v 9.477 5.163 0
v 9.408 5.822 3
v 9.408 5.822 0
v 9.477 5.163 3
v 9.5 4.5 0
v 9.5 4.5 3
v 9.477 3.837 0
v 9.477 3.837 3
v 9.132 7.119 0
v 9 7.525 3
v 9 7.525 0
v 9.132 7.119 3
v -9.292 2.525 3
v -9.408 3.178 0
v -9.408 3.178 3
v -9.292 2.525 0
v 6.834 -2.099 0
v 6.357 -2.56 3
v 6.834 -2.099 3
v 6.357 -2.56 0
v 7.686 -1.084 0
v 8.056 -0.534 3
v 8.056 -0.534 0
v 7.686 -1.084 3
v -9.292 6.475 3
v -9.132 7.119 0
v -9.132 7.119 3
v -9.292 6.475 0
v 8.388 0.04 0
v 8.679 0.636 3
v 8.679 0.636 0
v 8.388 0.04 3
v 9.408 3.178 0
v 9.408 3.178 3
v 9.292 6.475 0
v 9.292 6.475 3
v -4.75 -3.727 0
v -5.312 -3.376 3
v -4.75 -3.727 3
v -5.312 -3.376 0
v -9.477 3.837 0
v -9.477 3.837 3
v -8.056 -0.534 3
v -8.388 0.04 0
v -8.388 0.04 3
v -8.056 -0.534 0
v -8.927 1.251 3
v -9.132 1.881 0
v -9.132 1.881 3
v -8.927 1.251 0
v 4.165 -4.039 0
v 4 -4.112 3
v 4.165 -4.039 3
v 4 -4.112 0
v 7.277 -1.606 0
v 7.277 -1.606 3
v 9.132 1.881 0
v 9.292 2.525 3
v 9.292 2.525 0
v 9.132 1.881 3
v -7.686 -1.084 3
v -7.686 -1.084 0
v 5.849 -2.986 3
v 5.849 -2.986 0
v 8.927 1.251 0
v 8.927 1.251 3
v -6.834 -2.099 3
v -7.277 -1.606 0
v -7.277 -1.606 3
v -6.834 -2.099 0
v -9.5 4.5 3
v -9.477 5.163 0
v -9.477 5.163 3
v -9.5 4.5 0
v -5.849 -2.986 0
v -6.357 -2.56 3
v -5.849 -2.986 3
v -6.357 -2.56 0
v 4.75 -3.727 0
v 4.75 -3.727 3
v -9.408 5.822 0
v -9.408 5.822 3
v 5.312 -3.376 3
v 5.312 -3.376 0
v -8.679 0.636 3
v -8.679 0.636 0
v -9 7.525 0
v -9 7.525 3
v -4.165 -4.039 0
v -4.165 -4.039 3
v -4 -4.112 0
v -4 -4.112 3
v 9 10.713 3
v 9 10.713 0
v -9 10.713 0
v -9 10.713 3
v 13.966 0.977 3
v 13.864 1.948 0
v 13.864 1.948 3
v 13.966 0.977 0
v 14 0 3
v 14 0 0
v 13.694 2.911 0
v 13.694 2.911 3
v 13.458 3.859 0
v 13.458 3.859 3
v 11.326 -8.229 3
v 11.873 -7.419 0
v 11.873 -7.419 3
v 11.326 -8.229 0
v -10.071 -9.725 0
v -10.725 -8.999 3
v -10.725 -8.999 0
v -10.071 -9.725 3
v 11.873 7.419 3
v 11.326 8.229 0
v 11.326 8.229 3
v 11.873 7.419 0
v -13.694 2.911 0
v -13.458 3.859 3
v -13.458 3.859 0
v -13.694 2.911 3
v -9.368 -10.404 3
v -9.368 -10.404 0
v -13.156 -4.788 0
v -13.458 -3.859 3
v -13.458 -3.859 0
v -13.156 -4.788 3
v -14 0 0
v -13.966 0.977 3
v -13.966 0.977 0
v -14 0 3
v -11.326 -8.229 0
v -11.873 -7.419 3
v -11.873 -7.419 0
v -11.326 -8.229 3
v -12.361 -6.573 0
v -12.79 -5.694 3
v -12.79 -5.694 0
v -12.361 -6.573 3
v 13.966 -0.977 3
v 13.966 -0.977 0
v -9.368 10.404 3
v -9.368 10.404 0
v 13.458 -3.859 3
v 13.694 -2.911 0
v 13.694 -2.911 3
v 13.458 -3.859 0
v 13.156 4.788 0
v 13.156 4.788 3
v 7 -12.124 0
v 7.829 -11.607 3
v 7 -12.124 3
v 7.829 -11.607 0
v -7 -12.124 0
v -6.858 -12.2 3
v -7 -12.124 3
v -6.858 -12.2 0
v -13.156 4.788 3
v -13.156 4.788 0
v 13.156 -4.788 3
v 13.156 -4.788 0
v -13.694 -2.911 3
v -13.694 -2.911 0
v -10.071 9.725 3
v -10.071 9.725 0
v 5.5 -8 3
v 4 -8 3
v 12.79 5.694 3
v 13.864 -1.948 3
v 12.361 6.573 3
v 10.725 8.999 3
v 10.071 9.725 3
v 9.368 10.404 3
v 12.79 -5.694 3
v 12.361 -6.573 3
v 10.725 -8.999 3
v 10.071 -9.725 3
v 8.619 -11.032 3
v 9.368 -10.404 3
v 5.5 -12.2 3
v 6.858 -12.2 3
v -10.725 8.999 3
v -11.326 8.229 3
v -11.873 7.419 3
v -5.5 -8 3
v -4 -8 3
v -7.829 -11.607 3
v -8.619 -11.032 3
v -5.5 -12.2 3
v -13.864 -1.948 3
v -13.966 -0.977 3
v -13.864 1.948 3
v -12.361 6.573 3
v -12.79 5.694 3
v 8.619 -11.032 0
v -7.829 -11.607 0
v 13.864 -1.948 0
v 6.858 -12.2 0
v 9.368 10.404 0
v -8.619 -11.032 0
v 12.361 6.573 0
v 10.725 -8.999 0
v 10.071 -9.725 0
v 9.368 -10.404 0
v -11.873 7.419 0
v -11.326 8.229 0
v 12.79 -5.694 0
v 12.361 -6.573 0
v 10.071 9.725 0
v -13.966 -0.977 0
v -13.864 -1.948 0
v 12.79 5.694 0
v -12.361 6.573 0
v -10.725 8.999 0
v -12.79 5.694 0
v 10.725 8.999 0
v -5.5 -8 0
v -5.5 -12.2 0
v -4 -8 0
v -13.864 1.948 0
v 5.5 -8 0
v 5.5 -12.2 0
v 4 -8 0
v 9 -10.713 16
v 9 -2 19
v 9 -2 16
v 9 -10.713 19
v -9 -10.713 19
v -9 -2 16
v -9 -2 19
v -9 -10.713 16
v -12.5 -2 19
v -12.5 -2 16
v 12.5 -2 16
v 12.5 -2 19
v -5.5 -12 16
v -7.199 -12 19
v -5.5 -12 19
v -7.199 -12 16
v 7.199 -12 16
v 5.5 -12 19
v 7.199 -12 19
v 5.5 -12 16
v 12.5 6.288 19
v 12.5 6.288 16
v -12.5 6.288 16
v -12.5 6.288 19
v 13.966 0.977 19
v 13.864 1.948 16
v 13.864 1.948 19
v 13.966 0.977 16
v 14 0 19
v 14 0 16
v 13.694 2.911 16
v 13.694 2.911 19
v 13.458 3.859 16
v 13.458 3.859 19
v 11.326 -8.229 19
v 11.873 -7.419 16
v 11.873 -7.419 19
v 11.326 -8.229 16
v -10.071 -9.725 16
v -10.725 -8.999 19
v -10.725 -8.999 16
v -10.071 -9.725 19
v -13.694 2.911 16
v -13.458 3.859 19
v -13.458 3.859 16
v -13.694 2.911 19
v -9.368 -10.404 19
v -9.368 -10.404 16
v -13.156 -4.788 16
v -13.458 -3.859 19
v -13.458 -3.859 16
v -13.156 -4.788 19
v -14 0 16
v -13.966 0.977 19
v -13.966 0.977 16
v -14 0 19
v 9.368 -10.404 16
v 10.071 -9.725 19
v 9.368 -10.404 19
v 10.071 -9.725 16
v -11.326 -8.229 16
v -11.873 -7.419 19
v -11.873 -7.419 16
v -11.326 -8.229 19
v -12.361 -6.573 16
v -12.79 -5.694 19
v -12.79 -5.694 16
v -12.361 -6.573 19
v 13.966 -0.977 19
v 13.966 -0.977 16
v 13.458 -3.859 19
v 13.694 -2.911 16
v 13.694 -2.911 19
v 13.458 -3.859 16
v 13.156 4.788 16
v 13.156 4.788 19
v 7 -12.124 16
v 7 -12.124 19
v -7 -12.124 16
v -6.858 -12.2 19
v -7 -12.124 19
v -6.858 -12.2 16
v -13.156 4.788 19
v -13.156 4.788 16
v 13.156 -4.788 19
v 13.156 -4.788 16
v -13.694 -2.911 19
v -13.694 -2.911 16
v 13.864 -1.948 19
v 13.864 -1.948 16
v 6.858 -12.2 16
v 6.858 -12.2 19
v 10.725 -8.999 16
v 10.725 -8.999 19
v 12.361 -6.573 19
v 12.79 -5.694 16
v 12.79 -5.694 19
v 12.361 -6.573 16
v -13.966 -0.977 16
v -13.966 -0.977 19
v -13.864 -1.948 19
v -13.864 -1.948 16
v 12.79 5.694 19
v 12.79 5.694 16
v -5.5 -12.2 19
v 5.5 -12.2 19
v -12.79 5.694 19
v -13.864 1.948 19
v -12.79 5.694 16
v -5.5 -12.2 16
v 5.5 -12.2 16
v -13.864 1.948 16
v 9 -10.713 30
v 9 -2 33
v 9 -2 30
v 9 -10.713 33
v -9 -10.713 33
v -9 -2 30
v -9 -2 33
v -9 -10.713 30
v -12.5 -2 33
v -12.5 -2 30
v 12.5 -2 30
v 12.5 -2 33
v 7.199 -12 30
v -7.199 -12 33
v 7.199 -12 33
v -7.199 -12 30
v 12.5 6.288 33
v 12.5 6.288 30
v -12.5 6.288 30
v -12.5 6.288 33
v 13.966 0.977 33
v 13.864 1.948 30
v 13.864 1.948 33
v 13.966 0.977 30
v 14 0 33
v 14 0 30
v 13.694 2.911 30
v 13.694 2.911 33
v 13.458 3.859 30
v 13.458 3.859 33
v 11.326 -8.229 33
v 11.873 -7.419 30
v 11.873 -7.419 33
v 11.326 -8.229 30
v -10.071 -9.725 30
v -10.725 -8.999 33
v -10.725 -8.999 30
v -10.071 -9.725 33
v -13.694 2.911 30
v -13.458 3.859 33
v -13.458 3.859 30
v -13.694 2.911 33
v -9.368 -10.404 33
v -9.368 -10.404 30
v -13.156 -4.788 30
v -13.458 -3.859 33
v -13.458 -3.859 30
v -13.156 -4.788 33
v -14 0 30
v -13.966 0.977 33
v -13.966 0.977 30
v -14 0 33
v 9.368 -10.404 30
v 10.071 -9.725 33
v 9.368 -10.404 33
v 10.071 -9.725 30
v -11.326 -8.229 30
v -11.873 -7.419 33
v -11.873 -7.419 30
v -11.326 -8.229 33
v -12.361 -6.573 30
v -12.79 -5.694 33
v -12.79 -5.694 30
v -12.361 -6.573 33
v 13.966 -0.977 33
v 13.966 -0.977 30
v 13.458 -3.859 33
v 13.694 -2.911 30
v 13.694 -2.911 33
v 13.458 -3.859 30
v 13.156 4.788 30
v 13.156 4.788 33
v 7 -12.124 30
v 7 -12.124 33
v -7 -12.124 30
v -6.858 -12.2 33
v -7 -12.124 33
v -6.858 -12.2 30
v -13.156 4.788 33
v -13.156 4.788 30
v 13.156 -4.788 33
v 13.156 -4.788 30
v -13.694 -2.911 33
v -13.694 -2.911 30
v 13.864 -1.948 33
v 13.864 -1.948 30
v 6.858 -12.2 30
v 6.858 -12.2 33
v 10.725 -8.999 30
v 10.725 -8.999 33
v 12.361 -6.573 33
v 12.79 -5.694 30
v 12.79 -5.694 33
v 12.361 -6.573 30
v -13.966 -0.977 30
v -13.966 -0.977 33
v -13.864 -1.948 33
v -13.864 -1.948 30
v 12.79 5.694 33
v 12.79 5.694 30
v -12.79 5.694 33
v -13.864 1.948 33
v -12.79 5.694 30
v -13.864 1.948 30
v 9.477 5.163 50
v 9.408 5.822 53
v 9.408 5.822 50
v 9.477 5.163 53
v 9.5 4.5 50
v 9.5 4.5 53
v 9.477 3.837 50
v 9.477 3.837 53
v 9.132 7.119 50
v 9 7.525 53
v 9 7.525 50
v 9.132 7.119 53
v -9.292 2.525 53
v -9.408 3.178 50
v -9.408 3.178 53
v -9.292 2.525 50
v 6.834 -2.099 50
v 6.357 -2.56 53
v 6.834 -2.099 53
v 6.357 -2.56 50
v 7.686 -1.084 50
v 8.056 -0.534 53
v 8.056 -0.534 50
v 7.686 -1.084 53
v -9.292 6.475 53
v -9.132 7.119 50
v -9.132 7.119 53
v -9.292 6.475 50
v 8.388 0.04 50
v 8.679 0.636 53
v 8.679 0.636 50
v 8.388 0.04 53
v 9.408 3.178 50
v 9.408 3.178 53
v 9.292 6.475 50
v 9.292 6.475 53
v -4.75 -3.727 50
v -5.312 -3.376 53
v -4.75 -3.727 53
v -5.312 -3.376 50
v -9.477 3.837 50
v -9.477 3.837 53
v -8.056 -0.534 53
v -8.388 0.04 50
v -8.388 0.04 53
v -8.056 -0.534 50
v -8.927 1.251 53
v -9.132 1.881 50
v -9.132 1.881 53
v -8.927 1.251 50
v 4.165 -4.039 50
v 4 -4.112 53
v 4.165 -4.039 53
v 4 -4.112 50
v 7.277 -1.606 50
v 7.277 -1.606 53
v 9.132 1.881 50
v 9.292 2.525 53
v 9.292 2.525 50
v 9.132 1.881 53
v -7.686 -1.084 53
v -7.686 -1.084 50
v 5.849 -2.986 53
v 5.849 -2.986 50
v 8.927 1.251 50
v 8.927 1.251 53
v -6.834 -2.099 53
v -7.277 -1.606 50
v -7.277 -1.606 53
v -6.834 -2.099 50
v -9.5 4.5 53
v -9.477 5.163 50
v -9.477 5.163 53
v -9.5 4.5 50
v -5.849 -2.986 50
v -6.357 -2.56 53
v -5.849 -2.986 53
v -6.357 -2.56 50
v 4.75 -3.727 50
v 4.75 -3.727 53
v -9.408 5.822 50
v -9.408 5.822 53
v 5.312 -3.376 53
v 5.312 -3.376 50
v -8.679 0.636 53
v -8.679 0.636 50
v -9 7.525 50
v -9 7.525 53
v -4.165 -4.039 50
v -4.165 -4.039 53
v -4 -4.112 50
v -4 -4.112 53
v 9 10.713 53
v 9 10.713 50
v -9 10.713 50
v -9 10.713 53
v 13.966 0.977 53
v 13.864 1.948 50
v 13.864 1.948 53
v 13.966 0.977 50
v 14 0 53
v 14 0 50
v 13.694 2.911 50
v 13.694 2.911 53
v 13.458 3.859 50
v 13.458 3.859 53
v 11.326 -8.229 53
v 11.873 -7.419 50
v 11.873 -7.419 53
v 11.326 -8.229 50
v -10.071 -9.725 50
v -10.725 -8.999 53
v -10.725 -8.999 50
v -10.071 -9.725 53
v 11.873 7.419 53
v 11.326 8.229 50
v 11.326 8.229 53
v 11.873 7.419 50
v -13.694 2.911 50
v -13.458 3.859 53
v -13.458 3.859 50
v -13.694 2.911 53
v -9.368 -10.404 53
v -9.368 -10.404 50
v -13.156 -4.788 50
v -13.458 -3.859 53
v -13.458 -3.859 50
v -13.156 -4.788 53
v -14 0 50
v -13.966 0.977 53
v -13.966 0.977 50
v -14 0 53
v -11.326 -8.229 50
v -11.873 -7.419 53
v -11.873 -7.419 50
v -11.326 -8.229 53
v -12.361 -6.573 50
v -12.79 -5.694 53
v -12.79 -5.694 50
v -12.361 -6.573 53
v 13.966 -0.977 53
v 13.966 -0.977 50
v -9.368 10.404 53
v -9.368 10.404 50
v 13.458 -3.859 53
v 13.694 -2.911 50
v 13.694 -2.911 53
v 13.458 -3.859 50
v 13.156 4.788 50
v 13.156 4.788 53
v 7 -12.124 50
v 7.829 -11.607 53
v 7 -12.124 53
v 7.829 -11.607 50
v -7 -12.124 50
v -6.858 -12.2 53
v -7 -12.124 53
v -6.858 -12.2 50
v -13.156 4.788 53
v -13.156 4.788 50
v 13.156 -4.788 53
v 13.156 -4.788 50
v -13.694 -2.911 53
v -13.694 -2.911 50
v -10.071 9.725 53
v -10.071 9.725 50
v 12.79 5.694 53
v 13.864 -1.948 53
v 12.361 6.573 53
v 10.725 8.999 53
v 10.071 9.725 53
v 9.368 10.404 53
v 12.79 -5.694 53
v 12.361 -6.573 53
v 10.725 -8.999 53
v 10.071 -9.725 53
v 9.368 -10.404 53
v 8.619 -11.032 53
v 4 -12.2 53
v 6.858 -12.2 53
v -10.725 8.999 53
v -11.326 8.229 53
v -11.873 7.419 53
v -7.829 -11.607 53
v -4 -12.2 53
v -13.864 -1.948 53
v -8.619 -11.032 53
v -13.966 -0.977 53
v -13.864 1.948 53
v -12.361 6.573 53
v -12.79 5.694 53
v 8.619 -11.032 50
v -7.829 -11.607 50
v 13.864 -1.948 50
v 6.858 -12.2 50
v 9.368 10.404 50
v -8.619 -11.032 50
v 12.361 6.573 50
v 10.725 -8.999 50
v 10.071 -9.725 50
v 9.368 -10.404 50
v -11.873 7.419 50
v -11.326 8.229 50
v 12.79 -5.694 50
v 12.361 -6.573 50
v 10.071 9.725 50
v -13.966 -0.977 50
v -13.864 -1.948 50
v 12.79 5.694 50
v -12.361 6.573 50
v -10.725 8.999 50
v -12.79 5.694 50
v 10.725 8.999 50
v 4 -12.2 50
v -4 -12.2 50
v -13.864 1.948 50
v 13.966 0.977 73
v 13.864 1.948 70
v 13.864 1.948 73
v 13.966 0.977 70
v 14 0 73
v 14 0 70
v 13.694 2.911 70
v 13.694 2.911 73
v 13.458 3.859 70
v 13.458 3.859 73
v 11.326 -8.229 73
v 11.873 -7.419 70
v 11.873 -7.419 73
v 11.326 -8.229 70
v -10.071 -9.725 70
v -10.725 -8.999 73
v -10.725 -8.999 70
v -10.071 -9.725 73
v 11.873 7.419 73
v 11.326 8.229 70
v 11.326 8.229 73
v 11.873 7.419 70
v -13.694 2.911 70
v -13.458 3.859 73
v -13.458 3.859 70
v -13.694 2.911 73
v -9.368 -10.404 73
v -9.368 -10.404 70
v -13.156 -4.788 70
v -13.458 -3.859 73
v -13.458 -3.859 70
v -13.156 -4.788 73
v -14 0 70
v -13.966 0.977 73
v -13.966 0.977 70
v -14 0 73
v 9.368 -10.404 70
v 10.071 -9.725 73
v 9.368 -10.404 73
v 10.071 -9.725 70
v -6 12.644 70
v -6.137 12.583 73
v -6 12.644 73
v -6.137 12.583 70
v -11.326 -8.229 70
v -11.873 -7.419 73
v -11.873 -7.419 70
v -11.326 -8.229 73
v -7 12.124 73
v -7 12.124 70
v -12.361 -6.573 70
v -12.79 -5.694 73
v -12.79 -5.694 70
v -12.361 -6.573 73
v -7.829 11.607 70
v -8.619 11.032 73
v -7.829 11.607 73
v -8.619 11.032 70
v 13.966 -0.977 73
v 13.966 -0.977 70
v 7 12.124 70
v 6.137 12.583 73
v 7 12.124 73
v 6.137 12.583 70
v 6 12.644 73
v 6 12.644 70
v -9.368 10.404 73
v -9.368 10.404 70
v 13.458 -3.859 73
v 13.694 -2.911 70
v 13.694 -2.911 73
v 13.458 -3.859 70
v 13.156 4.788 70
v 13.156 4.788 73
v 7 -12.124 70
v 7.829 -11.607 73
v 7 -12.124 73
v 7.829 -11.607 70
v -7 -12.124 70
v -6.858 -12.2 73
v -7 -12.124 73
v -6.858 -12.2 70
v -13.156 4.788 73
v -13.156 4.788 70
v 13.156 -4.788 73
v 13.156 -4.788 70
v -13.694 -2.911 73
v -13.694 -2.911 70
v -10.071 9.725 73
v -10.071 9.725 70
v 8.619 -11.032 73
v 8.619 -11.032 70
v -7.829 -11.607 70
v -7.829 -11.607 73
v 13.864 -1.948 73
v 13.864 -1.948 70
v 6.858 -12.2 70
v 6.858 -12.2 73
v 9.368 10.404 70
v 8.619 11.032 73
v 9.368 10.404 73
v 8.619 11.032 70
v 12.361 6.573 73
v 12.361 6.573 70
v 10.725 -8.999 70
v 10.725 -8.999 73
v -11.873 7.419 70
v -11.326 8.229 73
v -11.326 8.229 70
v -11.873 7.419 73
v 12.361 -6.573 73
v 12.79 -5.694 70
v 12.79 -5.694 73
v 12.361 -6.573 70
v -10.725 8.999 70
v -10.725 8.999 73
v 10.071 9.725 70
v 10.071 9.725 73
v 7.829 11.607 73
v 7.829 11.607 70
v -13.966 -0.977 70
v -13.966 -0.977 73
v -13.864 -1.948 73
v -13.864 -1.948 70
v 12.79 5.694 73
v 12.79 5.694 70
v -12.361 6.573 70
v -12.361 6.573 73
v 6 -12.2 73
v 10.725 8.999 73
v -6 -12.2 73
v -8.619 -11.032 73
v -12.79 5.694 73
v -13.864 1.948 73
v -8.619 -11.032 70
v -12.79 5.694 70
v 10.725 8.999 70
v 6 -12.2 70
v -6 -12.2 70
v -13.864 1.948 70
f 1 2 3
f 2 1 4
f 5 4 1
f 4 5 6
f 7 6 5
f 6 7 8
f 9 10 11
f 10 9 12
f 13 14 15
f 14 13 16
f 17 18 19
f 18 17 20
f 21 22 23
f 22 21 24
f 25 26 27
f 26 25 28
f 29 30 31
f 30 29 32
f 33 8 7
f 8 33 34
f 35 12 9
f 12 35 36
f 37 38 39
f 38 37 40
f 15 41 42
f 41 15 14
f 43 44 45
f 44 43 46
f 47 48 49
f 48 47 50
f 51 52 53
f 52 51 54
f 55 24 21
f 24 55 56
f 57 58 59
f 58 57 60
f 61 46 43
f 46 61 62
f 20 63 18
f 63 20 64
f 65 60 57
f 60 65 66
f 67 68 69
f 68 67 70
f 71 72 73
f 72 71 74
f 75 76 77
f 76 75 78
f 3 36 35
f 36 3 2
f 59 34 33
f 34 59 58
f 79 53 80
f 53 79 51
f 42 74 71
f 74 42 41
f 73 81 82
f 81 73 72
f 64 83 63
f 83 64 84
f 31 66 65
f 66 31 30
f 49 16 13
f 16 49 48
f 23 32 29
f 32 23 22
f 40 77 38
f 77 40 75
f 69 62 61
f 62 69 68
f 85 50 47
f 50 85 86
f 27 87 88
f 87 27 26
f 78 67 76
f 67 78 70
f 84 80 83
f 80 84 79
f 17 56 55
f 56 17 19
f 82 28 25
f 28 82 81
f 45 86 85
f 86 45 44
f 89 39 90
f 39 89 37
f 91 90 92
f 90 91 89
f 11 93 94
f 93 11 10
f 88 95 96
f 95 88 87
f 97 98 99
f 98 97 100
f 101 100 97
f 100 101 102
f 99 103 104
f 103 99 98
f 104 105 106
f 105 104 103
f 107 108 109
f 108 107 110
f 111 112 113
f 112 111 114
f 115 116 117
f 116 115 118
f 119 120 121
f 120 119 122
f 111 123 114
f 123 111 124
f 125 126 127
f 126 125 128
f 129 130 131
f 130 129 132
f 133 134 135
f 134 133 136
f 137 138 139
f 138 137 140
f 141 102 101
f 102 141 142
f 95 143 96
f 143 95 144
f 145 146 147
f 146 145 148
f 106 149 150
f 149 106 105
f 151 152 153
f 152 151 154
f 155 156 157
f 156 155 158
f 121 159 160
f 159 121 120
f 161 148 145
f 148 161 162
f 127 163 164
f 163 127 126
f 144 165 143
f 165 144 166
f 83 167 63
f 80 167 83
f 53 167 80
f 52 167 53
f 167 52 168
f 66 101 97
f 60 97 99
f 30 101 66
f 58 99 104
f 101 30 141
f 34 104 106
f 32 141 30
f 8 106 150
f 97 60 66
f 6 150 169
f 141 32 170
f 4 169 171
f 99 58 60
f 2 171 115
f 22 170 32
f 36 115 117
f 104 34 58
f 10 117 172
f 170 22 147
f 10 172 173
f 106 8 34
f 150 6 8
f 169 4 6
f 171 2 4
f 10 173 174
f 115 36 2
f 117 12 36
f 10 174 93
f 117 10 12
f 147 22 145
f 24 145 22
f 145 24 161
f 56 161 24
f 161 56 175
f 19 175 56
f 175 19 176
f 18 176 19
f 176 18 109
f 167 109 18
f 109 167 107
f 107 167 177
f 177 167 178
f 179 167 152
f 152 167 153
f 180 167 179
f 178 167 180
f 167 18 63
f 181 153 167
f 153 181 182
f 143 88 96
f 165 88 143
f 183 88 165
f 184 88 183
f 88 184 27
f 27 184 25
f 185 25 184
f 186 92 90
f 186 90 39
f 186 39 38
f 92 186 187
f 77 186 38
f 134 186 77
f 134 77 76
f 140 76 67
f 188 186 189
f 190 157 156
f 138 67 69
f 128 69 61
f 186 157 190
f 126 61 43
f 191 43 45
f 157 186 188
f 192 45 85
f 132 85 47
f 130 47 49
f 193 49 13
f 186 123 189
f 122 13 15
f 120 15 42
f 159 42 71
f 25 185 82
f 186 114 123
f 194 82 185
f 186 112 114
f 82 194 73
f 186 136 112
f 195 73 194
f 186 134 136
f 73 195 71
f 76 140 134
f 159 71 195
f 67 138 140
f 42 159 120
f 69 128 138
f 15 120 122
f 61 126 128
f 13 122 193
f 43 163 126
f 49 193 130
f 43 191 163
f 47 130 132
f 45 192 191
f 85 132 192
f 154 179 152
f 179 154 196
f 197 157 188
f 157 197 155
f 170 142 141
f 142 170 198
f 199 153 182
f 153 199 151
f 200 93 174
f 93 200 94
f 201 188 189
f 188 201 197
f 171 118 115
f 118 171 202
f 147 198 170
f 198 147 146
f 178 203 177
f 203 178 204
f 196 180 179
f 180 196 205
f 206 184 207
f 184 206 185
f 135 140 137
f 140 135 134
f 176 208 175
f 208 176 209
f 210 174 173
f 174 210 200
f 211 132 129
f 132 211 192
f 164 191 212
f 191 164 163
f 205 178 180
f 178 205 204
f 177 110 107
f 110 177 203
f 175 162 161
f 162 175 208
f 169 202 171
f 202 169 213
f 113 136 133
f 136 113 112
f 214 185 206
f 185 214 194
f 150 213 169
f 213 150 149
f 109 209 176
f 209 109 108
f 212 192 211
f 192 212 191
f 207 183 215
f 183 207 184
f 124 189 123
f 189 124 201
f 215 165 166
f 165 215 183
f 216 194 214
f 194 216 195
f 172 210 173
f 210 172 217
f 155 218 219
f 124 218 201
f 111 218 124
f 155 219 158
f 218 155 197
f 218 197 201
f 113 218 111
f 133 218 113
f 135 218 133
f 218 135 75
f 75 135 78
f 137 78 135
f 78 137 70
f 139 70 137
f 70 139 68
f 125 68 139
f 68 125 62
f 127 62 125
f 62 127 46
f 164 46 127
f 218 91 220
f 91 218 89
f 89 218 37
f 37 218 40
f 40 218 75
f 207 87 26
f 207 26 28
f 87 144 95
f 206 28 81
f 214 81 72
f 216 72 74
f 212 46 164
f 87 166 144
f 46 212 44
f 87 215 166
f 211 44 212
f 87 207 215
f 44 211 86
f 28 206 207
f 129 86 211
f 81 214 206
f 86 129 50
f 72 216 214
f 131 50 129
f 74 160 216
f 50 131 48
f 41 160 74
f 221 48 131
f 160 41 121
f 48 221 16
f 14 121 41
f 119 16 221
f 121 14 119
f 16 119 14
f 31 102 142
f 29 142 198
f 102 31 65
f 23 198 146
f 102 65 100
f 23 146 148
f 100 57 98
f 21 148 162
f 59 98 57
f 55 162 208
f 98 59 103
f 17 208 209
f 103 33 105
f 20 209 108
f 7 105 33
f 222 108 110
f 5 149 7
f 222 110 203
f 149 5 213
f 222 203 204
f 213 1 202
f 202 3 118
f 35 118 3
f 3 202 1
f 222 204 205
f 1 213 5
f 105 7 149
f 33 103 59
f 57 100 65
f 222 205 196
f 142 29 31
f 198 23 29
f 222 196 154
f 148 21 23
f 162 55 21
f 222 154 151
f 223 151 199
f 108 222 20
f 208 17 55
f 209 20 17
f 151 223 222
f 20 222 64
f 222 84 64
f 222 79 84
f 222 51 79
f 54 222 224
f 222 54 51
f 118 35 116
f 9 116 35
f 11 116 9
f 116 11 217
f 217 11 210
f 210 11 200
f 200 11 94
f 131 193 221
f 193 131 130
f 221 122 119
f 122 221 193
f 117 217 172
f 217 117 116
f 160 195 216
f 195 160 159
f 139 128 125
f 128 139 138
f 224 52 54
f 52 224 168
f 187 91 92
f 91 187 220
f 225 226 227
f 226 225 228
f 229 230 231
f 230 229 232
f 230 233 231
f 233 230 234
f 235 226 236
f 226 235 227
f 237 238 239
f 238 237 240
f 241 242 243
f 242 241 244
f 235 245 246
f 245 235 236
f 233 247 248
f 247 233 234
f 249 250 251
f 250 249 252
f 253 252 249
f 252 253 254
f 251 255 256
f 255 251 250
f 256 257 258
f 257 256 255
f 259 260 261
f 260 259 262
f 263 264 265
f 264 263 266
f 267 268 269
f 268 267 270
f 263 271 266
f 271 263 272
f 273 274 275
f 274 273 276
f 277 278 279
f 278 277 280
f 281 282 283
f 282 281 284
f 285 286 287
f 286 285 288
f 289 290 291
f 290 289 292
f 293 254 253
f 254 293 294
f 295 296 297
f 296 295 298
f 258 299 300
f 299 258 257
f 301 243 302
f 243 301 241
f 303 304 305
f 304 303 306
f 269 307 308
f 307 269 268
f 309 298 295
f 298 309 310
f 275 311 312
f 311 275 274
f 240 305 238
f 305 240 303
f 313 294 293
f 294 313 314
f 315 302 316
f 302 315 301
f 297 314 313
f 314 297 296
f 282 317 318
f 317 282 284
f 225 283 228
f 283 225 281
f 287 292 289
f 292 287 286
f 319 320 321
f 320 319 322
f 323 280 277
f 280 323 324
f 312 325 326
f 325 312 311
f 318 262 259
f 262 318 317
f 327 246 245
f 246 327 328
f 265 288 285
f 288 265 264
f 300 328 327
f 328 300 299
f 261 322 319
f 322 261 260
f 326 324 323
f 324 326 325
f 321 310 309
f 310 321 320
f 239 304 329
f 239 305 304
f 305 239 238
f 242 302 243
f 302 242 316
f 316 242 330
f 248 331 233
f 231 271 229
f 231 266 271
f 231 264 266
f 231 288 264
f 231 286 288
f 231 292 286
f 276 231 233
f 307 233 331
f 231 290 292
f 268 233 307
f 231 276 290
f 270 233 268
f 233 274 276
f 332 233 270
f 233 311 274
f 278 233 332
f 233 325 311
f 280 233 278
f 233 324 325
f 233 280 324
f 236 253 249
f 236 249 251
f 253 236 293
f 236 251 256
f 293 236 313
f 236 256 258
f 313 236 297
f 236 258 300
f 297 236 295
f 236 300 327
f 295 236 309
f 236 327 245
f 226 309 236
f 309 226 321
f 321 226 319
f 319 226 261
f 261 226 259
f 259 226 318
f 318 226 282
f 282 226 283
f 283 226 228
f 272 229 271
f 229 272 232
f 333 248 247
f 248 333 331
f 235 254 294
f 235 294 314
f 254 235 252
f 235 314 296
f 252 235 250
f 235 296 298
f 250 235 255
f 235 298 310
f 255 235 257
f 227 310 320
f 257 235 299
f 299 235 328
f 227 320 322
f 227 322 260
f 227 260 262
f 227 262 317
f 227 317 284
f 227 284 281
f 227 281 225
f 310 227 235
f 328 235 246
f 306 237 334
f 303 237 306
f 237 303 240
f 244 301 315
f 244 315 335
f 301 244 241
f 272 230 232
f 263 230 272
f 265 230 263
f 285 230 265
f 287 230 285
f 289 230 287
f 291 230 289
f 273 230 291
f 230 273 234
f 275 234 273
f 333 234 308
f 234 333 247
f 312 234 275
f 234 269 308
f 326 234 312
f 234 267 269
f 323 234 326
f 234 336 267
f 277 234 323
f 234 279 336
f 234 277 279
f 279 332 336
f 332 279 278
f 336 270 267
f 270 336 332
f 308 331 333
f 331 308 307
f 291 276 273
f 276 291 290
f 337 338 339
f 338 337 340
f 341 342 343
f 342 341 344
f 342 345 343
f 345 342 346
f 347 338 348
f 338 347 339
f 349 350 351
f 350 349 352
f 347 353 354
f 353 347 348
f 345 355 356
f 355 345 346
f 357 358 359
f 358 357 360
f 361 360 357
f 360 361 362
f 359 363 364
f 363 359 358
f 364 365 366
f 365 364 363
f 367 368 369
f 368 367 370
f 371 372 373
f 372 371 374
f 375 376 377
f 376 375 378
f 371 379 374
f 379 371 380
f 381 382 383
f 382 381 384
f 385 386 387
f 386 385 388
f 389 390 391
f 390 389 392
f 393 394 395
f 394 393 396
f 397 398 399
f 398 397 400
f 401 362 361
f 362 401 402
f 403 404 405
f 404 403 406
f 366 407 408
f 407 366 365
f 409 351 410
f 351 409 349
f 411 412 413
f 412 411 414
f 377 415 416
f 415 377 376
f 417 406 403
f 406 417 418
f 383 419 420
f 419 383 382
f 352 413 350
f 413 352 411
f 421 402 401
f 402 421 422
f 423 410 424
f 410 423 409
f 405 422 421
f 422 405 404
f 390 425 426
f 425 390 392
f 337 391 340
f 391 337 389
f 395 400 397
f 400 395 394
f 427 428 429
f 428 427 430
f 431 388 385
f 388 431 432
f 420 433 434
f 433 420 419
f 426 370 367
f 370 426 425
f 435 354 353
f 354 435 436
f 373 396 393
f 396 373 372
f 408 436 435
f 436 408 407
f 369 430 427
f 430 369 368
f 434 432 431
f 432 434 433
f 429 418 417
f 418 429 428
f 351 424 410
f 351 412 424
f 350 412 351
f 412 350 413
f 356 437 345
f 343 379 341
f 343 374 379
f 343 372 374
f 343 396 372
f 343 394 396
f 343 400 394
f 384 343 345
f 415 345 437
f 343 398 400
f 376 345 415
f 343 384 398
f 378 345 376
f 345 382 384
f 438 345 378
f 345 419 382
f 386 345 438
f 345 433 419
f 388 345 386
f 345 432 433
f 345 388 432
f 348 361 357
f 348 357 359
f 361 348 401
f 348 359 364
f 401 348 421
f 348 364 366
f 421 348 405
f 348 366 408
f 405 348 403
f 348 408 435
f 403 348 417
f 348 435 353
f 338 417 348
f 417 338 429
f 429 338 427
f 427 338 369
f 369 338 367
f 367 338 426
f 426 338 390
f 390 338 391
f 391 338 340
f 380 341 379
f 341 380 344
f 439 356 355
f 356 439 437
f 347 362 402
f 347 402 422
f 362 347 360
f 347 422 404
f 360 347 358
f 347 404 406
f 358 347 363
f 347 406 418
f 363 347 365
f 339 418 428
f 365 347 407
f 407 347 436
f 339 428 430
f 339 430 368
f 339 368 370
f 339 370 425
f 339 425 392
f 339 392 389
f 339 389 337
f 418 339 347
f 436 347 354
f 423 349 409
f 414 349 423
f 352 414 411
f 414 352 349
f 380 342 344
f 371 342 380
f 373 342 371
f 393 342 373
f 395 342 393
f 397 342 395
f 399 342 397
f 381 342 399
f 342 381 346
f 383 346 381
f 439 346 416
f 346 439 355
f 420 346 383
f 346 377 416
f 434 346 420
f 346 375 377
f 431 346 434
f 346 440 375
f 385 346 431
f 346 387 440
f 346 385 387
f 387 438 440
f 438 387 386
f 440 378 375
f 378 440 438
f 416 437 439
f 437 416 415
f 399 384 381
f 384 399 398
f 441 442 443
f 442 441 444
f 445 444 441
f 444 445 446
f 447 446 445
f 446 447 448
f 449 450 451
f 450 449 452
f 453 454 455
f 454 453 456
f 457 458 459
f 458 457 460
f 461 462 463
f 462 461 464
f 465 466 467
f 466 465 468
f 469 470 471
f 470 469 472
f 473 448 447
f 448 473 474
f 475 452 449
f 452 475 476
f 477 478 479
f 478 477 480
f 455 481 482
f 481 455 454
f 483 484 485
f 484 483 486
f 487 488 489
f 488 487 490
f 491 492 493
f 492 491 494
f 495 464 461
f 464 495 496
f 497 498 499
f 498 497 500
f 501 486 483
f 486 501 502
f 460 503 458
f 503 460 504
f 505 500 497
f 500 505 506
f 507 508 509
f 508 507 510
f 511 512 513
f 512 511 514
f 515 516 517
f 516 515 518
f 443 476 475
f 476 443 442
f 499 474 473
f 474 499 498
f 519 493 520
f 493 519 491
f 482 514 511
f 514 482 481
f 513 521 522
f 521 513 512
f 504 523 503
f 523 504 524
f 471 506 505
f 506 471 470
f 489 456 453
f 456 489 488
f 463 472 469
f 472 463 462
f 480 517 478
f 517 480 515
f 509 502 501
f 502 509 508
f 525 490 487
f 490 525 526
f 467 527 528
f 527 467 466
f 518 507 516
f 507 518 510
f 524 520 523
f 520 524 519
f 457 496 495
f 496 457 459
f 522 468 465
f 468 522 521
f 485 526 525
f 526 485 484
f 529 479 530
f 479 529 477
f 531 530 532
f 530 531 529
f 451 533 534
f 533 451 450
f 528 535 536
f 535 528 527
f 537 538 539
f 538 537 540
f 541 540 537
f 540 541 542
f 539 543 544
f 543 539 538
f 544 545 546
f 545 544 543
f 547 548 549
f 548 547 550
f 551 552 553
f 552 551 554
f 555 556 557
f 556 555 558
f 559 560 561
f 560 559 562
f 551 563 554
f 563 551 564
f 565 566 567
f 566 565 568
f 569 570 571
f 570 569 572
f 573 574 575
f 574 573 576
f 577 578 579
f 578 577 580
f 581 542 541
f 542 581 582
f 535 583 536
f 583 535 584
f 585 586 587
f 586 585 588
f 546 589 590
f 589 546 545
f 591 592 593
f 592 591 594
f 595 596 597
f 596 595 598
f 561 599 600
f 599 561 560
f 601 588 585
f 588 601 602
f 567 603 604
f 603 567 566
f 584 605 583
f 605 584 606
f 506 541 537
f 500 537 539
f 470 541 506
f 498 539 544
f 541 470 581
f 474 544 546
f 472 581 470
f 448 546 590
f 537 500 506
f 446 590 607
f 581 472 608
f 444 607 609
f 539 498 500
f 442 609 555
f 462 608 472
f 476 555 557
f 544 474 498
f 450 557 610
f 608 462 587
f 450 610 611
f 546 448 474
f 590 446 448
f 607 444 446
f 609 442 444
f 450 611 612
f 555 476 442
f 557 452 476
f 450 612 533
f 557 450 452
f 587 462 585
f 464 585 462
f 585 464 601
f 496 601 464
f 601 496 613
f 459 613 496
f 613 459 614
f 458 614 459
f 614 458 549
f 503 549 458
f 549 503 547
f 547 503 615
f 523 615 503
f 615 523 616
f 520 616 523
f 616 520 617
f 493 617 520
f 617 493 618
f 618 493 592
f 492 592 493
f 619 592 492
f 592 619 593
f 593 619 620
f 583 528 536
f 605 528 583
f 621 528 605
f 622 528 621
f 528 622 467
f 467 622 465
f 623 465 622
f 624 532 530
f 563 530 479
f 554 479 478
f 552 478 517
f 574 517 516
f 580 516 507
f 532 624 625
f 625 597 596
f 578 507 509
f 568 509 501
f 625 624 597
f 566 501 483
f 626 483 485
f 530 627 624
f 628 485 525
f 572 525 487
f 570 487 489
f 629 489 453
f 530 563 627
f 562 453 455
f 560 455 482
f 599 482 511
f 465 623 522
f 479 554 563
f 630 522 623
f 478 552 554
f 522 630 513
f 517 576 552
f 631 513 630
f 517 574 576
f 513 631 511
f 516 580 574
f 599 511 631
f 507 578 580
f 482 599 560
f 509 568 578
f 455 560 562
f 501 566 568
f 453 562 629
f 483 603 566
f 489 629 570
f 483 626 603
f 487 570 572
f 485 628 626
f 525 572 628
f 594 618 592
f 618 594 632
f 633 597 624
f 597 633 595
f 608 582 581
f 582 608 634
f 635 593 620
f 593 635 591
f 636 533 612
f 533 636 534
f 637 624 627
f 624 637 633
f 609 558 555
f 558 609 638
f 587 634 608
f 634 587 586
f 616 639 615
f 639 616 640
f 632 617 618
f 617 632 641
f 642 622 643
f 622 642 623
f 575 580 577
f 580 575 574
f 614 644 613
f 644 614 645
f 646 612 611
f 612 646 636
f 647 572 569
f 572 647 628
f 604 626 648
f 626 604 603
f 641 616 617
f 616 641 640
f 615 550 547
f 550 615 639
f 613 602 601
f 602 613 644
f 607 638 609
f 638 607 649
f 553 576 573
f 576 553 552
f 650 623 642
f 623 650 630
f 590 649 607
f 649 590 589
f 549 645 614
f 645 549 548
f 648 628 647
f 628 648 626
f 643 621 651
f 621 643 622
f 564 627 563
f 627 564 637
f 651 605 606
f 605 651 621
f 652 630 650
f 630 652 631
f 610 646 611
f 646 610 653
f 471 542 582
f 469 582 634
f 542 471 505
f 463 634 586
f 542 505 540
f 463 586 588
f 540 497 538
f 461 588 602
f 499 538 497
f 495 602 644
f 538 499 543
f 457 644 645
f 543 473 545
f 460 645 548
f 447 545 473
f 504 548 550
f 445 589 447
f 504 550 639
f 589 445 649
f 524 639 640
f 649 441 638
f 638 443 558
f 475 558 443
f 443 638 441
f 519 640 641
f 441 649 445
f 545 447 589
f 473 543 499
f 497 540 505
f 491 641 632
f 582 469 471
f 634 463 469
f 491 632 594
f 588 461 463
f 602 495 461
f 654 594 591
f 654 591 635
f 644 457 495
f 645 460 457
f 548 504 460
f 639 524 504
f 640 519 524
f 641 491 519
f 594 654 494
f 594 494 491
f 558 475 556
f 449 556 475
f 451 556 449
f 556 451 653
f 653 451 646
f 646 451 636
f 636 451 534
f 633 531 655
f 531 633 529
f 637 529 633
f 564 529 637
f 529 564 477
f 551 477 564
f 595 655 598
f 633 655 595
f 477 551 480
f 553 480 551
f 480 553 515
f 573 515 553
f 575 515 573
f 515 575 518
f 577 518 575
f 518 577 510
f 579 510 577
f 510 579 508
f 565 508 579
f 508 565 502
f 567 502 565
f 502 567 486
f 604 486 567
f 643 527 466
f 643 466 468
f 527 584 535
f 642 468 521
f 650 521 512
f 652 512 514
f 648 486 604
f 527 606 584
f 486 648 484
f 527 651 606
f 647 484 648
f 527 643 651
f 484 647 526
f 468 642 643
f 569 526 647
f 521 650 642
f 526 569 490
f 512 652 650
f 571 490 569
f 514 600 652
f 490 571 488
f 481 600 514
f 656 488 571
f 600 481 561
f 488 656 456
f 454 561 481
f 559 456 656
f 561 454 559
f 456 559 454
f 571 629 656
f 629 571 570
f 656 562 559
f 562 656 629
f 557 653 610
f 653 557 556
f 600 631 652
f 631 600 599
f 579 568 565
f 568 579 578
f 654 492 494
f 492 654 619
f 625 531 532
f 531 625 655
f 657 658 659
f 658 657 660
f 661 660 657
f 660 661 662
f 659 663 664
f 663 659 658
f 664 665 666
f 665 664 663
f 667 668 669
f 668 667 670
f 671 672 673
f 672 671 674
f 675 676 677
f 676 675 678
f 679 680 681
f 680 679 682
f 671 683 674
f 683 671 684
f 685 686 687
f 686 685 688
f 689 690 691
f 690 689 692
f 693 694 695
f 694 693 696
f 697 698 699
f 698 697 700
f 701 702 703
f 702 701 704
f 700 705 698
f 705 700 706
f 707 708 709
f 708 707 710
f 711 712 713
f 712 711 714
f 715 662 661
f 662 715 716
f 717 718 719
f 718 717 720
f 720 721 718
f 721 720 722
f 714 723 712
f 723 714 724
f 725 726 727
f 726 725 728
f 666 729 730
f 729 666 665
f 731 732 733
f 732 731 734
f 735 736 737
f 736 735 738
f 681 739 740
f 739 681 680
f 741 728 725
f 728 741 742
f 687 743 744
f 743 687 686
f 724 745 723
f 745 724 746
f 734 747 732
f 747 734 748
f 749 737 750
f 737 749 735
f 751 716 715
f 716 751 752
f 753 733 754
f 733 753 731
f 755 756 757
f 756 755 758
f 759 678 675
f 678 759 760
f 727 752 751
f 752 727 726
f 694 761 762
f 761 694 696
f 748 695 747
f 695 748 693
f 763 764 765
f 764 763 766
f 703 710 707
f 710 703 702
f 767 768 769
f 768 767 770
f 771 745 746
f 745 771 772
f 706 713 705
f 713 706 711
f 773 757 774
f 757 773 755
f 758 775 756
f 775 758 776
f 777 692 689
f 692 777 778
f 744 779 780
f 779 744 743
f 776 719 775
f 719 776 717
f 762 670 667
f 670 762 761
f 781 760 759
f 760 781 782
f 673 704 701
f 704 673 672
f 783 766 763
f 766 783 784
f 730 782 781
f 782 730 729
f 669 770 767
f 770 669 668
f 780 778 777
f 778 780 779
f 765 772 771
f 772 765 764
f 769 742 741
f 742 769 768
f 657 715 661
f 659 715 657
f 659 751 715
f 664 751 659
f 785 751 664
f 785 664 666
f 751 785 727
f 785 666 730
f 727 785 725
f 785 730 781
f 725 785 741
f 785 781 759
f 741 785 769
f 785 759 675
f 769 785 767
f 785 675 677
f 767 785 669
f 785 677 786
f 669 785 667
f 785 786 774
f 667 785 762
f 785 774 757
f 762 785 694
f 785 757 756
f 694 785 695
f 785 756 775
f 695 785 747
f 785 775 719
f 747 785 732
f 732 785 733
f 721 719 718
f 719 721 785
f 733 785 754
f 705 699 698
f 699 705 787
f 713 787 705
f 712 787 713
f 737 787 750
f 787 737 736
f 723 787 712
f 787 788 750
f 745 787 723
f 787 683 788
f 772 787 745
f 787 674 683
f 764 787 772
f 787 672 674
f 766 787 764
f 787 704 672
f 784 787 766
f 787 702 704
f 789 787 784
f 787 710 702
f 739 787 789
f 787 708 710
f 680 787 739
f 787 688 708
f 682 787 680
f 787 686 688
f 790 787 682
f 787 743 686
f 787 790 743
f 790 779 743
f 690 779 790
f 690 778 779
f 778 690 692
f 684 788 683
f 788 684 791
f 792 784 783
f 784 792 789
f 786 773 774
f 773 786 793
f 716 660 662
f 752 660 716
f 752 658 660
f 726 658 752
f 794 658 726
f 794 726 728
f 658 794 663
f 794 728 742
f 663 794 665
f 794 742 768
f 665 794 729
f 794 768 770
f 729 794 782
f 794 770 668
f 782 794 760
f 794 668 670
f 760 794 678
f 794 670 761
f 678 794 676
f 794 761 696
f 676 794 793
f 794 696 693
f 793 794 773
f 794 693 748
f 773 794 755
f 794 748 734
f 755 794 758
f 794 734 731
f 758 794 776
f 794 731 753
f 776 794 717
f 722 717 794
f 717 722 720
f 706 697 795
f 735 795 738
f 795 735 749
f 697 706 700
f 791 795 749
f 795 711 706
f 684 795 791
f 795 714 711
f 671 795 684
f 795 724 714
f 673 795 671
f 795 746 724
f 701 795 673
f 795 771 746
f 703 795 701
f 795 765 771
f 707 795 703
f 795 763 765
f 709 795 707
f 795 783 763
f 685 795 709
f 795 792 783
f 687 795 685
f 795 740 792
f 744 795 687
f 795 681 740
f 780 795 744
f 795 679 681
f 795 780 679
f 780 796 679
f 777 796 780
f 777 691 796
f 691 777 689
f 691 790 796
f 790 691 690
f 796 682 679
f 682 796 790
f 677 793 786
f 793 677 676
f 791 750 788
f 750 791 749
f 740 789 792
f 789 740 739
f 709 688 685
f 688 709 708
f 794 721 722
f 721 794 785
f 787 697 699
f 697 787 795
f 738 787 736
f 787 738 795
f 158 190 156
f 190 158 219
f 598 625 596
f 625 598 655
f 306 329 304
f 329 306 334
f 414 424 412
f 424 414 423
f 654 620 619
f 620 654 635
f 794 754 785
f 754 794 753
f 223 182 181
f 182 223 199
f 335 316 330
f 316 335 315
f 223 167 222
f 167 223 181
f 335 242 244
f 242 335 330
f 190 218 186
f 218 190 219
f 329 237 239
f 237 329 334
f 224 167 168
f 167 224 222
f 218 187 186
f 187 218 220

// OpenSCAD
// file: buttress.scad
include <dim.scad>

EPS = 0.01;
EPS2 = EPS * 2;
BATTERY_CUTOUT		= 18;	// 12 to hold. This value set for drop in.
TROUGH 				= 12;

module battery(h)
{
	BATTERY_Y = R_INNER - R_BATTERY;

	translate([0, BATTERY_Y, 0]) {
	    cylinder(h=h, d=D_BATTERY);

	    translate([-BATTERY_CUTOUT/2, 0, 0]) {
	        cube(size=[BATTERY_CUTOUT, 40, h]);
	    }
	}
}

module circuitry(h, deltaY, wing)
{
	W_MC 	= 18;
	H_MC    = 10;
	Y_MC    = -12;

	translate([-W_MC/2, Y_MC, 0]) cube(size=[W_MC, H_MC, h]);
	if (wing) {
		translate([-W_WING/2, Y_MC + H_MC, 0]) cube(size=[W_WING, H_WING + deltaY, h]);
	}
}

module buttress(	battery=true, 
					mc=true, 
					mcDeltaY=0, 
					trough=0, 
					wing=true)
{
	difference() {
		cylinder(h=H_BUTTRESS, d=D_INNER);	

		// Battery
		if (battery) {
			translate([0, 0, -EPS]) battery(H_BUTTRESS + EPS2);
		}

		// Board
		if (mc) {
			translate([0, 0, -EPS]) circuitry(H_BUTTRESS + EPS2, mcDeltaY, wing);
		}

		if (trough != 0) {
			T = trough < 0 ? TROUGH : trough;
            translate([-T/2, -20, -EPS]) {
                cube(size=[T, 40, H_BUTTRESS + EPS2]);
            }
		}
	}
}
// file: dim.scad
M_0					= 0;
M_RAIL_START		= 12;

M_BUTTRESS_0		= M_0;			// speaker holder, behind wings
M_BUTTRESS_1		= M_0 + 16;
M_BUTTRESS_2		= M_0 + 30;
M_BUTTRESS_3		= M_0 + 50;
M_BUTTRESS_4		= M_0 + 70;		// holds speaker in place

M_WAY_BACK			= -20;
H_FAR				= 200;

MM_TO_INCHES = 1 / 25.4;
INCHES_TO_MM = 25.4;

D_INNER				= 28;
R_INNER     		= D_INNER / 2;
D_SABER_OUTER		= 37.5;

H_BUTTRESS			= 3;

H_BATTERY           = 68;
D_BATTERY           = 18.50 + 0.5;    // An 1850. Huh. 
R_BATTERY			= D_BATTERY / 2;

RAIL_ANGLE_0		=  25; //38;
RAIL_ANGLE_1		= -25; //-38;
RAIL_ANGLE_2		=  180 - RAIL_ANGLE_0;
RAIL_ANGLE_3		= -180 - RAIL_ANGLE_1;

X_RAIL				= 3;
Y_RAIL				= 4;

W_WING  			= 25;
H_WING  			= 10.5;	// higher over power converter
// file: ../vents.scad
module lowerVent1(w, h, extrusion)
{
    h1 = h - w * 1.2;
    h2 = h;
    rotate([90, 0, 90]) {
        linear_extrude(height=extrusion) {
            polygon([[-w/2,0], [w/2,0], [w/2,h1], [0,h2], [-w/2,h1]]);
        }
    }    
}


module vent1(w, h, n, extrusion, stop=100)
{
    angle = 360 / n;
    N = stop < n ? stop : n;

	for(r=[0:N-1]) {
		rotate([0, 0, angle*r]) {
            lowerVent1(w, h, extrusion);
        }
    }
}

module vent2(w, h, n, extrusion, stop=100)
{
    angle = 360 / n;
    N = stop < n ? stop : n;

	for(r=[0:N-1]) {
		rotate([0, 0, angle*r]) {

            rotate([90, 0, 90]) {
                linear_extrude(height=extrusion) {
                    polygon([[0,0], [w/2,w/2], [w/2, h-w/2], [0, h], [-w/2, h-w/2], [-w/2, w/2]]);
                }
            }
        }
    }
}

module vent3(w, h, n, extrusion)
{
    h1 = 0.6 * h;
    h2 = h;
    
	W = w / 2;
	IW = W * 0.62;
	IH = h1 * 0.38;
    
    angle = 360 / n;
	for(r=[0:n-1]) {
		rotate([0, 0, angle*r]) {

            rotate([90, 0, 90]) {
                linear_extrude(height=extrusion) {
                    difference() {
                        polygon([[-W,0], [W,0], [W,h1], [0,h2], [-W,h1]]);
                        polygon([[-IW, 0], [IW, 0], [IW, IH], [-IW, IH]]);
                    }
                }
            }
        }
	}
}

module vent4(h, r, extrusion)
{
    alpha = 16;
    w = sin(alpha) * r;

	for(i=[0:11]) {
		rotate([0, 0, 30*i]) {
			rotate([90, 0, 90]) {
				linear_extrude(height=extrusion) {
					polygon([[-w/2, 0], [w/2, 0], [0, h] ]);
				}
			}
		}
		rotate([0, 0, 30*i + 15]) {
			rotate([90, 0, 90]) {
				linear_extrude(height=extrusion) {
					polygon([[-w/2, h], [0, 0], [w/2, h] ]);
				}
			}
		}
	}
}


difference() 
{
    H = 16;
    D = D_INNER;
	tube(H, D/2 - 2, D/2);	
    
	translate([0, 0, 3]) {
        //vent1(6, H-6, 10, 40);
        //vent2(6, H-6, 8, 40);
        vent3(6, H-6, 7, 40);
		//vent4(H-6, D/2, D);
	}
}
// file: ../shapes.scad
FACES   = 180;
EPSILON = 0.1;
PIN	    = 2.54;


module tube(_h, _rInner, _rOuter) {
	difference() {
		cylinder(h=_h, r=_rOuter, $fn=FACES);
		translate([0,0,-EPSILON]) {
			cylinder(h=_h + EPSILON*2, r=_rInner, $fn=FACES);
		}
	}
}

module shelf(_r0, _h, _r1) {
	rotate_extrude($fn=FACES) {
		polygon([[_r0, 0], [_r1, _h], [_r0, _h]]);
	}
}


module pinsAtTube(r, h, nX, nY, longY)
{
	OFFSET = sqrt(r * r - PIN * PIN * nX * nX / 4);

	Y = longY ? 40 : PIN * nY;

    translate([-nX * PIN / 2, OFFSET - PIN * nY, 0]) {
        cube([nX * PIN, Y, h]);
    }	
}

module roundedRect(h, d)
{
	$fn=20;

	D0 = d * 0.8;
	D1 = d * 0.2;
	H = h;

	hull()
	{
		translate([-D0/2, -D0/2, 0]) {
			cube([D0, D0, H]);
		}
		translate([-D0/2, -D0/2, 0])  cylinder(d=D1, h=H);
		translate([ D0/2, -D0/2, 0])  cylinder(d=D1, h=H);
		translate([-D0/2,  D0/2, 0])  cylinder(d=D1, h=H);
		translate([ D0/2,  D0/2, 0])  cylinder(d=D1, h=H);
	}
}
// main file
use <../threads.scad>
use <../shapes.scad>
use <../vents.scad>
include <dim.scad>
use <buttress.scad>

INCHES_TO_MM = 25.4;
MM_TO_INCHES = 1 / 25.4;
$fn = 90;
EPS = 0.01;
EPS2 = EPS * 2;

module rail(r)
{
    H = M_TRANSITION - M_RAIL_START - T_TRANSITION_RING;

    difference() {
        intersection()
        {
            innerTube();
            rotate([0, 0, r]) {
                translate([R_INNER - X_RAIL/2, 0, M_RAIL_START + H/2]) {
                    rotate([0, 0, -r]) {
                        cube(size=[20, Y_RAIL, H], center=true);
                    }
                }            
            }        
        }
        W = W_WING + 1;
   	    translate([-W/2, -40, M_WAY_BACK]) {
	        cube(size=[W, 120, H_FAR]);
	    }
    }
}


difference() {
    union() {
        *union() {
            rail(RAIL_ANGLE_0);
            rail(RAIL_ANGLE_1);
            rail(RAIL_ANGLE_2);
            rail(RAIL_ANGLE_3);
        }
        translate([0, 0, M_BUTTRESS_0]) buttress(mc=false, trough = 8);
        translate([0, 0, M_BUTTRESS_1]) buttress(mcDeltaY=20
        );
        translate([0, 0, M_BUTTRESS_2]) buttress(mcDeltaY=20);
        translate([0, 0, M_BUTTRESS_3]) buttress(mc=false, trough=8);
        translate([0, 0, M_BUTTRESS_4]) buttress(battery=false, trough=12, mc=false);
    }
    // Flatten the bottom for printing.
    translate([-20, -D_INNER/2, M_WAY_BACK]) cube(size=[40, 1.8, H_FAR]);
    // Take out a chunk for access to the USB port.
    X_USB = 11; // 10 to tight fit
    Y_USB = 6;
    Z_USB = 20;
    translate([-X_USB/2, -R_INNER, M_0]) cube(size=[X_USB, Y_USB, Z_USB]);
}
